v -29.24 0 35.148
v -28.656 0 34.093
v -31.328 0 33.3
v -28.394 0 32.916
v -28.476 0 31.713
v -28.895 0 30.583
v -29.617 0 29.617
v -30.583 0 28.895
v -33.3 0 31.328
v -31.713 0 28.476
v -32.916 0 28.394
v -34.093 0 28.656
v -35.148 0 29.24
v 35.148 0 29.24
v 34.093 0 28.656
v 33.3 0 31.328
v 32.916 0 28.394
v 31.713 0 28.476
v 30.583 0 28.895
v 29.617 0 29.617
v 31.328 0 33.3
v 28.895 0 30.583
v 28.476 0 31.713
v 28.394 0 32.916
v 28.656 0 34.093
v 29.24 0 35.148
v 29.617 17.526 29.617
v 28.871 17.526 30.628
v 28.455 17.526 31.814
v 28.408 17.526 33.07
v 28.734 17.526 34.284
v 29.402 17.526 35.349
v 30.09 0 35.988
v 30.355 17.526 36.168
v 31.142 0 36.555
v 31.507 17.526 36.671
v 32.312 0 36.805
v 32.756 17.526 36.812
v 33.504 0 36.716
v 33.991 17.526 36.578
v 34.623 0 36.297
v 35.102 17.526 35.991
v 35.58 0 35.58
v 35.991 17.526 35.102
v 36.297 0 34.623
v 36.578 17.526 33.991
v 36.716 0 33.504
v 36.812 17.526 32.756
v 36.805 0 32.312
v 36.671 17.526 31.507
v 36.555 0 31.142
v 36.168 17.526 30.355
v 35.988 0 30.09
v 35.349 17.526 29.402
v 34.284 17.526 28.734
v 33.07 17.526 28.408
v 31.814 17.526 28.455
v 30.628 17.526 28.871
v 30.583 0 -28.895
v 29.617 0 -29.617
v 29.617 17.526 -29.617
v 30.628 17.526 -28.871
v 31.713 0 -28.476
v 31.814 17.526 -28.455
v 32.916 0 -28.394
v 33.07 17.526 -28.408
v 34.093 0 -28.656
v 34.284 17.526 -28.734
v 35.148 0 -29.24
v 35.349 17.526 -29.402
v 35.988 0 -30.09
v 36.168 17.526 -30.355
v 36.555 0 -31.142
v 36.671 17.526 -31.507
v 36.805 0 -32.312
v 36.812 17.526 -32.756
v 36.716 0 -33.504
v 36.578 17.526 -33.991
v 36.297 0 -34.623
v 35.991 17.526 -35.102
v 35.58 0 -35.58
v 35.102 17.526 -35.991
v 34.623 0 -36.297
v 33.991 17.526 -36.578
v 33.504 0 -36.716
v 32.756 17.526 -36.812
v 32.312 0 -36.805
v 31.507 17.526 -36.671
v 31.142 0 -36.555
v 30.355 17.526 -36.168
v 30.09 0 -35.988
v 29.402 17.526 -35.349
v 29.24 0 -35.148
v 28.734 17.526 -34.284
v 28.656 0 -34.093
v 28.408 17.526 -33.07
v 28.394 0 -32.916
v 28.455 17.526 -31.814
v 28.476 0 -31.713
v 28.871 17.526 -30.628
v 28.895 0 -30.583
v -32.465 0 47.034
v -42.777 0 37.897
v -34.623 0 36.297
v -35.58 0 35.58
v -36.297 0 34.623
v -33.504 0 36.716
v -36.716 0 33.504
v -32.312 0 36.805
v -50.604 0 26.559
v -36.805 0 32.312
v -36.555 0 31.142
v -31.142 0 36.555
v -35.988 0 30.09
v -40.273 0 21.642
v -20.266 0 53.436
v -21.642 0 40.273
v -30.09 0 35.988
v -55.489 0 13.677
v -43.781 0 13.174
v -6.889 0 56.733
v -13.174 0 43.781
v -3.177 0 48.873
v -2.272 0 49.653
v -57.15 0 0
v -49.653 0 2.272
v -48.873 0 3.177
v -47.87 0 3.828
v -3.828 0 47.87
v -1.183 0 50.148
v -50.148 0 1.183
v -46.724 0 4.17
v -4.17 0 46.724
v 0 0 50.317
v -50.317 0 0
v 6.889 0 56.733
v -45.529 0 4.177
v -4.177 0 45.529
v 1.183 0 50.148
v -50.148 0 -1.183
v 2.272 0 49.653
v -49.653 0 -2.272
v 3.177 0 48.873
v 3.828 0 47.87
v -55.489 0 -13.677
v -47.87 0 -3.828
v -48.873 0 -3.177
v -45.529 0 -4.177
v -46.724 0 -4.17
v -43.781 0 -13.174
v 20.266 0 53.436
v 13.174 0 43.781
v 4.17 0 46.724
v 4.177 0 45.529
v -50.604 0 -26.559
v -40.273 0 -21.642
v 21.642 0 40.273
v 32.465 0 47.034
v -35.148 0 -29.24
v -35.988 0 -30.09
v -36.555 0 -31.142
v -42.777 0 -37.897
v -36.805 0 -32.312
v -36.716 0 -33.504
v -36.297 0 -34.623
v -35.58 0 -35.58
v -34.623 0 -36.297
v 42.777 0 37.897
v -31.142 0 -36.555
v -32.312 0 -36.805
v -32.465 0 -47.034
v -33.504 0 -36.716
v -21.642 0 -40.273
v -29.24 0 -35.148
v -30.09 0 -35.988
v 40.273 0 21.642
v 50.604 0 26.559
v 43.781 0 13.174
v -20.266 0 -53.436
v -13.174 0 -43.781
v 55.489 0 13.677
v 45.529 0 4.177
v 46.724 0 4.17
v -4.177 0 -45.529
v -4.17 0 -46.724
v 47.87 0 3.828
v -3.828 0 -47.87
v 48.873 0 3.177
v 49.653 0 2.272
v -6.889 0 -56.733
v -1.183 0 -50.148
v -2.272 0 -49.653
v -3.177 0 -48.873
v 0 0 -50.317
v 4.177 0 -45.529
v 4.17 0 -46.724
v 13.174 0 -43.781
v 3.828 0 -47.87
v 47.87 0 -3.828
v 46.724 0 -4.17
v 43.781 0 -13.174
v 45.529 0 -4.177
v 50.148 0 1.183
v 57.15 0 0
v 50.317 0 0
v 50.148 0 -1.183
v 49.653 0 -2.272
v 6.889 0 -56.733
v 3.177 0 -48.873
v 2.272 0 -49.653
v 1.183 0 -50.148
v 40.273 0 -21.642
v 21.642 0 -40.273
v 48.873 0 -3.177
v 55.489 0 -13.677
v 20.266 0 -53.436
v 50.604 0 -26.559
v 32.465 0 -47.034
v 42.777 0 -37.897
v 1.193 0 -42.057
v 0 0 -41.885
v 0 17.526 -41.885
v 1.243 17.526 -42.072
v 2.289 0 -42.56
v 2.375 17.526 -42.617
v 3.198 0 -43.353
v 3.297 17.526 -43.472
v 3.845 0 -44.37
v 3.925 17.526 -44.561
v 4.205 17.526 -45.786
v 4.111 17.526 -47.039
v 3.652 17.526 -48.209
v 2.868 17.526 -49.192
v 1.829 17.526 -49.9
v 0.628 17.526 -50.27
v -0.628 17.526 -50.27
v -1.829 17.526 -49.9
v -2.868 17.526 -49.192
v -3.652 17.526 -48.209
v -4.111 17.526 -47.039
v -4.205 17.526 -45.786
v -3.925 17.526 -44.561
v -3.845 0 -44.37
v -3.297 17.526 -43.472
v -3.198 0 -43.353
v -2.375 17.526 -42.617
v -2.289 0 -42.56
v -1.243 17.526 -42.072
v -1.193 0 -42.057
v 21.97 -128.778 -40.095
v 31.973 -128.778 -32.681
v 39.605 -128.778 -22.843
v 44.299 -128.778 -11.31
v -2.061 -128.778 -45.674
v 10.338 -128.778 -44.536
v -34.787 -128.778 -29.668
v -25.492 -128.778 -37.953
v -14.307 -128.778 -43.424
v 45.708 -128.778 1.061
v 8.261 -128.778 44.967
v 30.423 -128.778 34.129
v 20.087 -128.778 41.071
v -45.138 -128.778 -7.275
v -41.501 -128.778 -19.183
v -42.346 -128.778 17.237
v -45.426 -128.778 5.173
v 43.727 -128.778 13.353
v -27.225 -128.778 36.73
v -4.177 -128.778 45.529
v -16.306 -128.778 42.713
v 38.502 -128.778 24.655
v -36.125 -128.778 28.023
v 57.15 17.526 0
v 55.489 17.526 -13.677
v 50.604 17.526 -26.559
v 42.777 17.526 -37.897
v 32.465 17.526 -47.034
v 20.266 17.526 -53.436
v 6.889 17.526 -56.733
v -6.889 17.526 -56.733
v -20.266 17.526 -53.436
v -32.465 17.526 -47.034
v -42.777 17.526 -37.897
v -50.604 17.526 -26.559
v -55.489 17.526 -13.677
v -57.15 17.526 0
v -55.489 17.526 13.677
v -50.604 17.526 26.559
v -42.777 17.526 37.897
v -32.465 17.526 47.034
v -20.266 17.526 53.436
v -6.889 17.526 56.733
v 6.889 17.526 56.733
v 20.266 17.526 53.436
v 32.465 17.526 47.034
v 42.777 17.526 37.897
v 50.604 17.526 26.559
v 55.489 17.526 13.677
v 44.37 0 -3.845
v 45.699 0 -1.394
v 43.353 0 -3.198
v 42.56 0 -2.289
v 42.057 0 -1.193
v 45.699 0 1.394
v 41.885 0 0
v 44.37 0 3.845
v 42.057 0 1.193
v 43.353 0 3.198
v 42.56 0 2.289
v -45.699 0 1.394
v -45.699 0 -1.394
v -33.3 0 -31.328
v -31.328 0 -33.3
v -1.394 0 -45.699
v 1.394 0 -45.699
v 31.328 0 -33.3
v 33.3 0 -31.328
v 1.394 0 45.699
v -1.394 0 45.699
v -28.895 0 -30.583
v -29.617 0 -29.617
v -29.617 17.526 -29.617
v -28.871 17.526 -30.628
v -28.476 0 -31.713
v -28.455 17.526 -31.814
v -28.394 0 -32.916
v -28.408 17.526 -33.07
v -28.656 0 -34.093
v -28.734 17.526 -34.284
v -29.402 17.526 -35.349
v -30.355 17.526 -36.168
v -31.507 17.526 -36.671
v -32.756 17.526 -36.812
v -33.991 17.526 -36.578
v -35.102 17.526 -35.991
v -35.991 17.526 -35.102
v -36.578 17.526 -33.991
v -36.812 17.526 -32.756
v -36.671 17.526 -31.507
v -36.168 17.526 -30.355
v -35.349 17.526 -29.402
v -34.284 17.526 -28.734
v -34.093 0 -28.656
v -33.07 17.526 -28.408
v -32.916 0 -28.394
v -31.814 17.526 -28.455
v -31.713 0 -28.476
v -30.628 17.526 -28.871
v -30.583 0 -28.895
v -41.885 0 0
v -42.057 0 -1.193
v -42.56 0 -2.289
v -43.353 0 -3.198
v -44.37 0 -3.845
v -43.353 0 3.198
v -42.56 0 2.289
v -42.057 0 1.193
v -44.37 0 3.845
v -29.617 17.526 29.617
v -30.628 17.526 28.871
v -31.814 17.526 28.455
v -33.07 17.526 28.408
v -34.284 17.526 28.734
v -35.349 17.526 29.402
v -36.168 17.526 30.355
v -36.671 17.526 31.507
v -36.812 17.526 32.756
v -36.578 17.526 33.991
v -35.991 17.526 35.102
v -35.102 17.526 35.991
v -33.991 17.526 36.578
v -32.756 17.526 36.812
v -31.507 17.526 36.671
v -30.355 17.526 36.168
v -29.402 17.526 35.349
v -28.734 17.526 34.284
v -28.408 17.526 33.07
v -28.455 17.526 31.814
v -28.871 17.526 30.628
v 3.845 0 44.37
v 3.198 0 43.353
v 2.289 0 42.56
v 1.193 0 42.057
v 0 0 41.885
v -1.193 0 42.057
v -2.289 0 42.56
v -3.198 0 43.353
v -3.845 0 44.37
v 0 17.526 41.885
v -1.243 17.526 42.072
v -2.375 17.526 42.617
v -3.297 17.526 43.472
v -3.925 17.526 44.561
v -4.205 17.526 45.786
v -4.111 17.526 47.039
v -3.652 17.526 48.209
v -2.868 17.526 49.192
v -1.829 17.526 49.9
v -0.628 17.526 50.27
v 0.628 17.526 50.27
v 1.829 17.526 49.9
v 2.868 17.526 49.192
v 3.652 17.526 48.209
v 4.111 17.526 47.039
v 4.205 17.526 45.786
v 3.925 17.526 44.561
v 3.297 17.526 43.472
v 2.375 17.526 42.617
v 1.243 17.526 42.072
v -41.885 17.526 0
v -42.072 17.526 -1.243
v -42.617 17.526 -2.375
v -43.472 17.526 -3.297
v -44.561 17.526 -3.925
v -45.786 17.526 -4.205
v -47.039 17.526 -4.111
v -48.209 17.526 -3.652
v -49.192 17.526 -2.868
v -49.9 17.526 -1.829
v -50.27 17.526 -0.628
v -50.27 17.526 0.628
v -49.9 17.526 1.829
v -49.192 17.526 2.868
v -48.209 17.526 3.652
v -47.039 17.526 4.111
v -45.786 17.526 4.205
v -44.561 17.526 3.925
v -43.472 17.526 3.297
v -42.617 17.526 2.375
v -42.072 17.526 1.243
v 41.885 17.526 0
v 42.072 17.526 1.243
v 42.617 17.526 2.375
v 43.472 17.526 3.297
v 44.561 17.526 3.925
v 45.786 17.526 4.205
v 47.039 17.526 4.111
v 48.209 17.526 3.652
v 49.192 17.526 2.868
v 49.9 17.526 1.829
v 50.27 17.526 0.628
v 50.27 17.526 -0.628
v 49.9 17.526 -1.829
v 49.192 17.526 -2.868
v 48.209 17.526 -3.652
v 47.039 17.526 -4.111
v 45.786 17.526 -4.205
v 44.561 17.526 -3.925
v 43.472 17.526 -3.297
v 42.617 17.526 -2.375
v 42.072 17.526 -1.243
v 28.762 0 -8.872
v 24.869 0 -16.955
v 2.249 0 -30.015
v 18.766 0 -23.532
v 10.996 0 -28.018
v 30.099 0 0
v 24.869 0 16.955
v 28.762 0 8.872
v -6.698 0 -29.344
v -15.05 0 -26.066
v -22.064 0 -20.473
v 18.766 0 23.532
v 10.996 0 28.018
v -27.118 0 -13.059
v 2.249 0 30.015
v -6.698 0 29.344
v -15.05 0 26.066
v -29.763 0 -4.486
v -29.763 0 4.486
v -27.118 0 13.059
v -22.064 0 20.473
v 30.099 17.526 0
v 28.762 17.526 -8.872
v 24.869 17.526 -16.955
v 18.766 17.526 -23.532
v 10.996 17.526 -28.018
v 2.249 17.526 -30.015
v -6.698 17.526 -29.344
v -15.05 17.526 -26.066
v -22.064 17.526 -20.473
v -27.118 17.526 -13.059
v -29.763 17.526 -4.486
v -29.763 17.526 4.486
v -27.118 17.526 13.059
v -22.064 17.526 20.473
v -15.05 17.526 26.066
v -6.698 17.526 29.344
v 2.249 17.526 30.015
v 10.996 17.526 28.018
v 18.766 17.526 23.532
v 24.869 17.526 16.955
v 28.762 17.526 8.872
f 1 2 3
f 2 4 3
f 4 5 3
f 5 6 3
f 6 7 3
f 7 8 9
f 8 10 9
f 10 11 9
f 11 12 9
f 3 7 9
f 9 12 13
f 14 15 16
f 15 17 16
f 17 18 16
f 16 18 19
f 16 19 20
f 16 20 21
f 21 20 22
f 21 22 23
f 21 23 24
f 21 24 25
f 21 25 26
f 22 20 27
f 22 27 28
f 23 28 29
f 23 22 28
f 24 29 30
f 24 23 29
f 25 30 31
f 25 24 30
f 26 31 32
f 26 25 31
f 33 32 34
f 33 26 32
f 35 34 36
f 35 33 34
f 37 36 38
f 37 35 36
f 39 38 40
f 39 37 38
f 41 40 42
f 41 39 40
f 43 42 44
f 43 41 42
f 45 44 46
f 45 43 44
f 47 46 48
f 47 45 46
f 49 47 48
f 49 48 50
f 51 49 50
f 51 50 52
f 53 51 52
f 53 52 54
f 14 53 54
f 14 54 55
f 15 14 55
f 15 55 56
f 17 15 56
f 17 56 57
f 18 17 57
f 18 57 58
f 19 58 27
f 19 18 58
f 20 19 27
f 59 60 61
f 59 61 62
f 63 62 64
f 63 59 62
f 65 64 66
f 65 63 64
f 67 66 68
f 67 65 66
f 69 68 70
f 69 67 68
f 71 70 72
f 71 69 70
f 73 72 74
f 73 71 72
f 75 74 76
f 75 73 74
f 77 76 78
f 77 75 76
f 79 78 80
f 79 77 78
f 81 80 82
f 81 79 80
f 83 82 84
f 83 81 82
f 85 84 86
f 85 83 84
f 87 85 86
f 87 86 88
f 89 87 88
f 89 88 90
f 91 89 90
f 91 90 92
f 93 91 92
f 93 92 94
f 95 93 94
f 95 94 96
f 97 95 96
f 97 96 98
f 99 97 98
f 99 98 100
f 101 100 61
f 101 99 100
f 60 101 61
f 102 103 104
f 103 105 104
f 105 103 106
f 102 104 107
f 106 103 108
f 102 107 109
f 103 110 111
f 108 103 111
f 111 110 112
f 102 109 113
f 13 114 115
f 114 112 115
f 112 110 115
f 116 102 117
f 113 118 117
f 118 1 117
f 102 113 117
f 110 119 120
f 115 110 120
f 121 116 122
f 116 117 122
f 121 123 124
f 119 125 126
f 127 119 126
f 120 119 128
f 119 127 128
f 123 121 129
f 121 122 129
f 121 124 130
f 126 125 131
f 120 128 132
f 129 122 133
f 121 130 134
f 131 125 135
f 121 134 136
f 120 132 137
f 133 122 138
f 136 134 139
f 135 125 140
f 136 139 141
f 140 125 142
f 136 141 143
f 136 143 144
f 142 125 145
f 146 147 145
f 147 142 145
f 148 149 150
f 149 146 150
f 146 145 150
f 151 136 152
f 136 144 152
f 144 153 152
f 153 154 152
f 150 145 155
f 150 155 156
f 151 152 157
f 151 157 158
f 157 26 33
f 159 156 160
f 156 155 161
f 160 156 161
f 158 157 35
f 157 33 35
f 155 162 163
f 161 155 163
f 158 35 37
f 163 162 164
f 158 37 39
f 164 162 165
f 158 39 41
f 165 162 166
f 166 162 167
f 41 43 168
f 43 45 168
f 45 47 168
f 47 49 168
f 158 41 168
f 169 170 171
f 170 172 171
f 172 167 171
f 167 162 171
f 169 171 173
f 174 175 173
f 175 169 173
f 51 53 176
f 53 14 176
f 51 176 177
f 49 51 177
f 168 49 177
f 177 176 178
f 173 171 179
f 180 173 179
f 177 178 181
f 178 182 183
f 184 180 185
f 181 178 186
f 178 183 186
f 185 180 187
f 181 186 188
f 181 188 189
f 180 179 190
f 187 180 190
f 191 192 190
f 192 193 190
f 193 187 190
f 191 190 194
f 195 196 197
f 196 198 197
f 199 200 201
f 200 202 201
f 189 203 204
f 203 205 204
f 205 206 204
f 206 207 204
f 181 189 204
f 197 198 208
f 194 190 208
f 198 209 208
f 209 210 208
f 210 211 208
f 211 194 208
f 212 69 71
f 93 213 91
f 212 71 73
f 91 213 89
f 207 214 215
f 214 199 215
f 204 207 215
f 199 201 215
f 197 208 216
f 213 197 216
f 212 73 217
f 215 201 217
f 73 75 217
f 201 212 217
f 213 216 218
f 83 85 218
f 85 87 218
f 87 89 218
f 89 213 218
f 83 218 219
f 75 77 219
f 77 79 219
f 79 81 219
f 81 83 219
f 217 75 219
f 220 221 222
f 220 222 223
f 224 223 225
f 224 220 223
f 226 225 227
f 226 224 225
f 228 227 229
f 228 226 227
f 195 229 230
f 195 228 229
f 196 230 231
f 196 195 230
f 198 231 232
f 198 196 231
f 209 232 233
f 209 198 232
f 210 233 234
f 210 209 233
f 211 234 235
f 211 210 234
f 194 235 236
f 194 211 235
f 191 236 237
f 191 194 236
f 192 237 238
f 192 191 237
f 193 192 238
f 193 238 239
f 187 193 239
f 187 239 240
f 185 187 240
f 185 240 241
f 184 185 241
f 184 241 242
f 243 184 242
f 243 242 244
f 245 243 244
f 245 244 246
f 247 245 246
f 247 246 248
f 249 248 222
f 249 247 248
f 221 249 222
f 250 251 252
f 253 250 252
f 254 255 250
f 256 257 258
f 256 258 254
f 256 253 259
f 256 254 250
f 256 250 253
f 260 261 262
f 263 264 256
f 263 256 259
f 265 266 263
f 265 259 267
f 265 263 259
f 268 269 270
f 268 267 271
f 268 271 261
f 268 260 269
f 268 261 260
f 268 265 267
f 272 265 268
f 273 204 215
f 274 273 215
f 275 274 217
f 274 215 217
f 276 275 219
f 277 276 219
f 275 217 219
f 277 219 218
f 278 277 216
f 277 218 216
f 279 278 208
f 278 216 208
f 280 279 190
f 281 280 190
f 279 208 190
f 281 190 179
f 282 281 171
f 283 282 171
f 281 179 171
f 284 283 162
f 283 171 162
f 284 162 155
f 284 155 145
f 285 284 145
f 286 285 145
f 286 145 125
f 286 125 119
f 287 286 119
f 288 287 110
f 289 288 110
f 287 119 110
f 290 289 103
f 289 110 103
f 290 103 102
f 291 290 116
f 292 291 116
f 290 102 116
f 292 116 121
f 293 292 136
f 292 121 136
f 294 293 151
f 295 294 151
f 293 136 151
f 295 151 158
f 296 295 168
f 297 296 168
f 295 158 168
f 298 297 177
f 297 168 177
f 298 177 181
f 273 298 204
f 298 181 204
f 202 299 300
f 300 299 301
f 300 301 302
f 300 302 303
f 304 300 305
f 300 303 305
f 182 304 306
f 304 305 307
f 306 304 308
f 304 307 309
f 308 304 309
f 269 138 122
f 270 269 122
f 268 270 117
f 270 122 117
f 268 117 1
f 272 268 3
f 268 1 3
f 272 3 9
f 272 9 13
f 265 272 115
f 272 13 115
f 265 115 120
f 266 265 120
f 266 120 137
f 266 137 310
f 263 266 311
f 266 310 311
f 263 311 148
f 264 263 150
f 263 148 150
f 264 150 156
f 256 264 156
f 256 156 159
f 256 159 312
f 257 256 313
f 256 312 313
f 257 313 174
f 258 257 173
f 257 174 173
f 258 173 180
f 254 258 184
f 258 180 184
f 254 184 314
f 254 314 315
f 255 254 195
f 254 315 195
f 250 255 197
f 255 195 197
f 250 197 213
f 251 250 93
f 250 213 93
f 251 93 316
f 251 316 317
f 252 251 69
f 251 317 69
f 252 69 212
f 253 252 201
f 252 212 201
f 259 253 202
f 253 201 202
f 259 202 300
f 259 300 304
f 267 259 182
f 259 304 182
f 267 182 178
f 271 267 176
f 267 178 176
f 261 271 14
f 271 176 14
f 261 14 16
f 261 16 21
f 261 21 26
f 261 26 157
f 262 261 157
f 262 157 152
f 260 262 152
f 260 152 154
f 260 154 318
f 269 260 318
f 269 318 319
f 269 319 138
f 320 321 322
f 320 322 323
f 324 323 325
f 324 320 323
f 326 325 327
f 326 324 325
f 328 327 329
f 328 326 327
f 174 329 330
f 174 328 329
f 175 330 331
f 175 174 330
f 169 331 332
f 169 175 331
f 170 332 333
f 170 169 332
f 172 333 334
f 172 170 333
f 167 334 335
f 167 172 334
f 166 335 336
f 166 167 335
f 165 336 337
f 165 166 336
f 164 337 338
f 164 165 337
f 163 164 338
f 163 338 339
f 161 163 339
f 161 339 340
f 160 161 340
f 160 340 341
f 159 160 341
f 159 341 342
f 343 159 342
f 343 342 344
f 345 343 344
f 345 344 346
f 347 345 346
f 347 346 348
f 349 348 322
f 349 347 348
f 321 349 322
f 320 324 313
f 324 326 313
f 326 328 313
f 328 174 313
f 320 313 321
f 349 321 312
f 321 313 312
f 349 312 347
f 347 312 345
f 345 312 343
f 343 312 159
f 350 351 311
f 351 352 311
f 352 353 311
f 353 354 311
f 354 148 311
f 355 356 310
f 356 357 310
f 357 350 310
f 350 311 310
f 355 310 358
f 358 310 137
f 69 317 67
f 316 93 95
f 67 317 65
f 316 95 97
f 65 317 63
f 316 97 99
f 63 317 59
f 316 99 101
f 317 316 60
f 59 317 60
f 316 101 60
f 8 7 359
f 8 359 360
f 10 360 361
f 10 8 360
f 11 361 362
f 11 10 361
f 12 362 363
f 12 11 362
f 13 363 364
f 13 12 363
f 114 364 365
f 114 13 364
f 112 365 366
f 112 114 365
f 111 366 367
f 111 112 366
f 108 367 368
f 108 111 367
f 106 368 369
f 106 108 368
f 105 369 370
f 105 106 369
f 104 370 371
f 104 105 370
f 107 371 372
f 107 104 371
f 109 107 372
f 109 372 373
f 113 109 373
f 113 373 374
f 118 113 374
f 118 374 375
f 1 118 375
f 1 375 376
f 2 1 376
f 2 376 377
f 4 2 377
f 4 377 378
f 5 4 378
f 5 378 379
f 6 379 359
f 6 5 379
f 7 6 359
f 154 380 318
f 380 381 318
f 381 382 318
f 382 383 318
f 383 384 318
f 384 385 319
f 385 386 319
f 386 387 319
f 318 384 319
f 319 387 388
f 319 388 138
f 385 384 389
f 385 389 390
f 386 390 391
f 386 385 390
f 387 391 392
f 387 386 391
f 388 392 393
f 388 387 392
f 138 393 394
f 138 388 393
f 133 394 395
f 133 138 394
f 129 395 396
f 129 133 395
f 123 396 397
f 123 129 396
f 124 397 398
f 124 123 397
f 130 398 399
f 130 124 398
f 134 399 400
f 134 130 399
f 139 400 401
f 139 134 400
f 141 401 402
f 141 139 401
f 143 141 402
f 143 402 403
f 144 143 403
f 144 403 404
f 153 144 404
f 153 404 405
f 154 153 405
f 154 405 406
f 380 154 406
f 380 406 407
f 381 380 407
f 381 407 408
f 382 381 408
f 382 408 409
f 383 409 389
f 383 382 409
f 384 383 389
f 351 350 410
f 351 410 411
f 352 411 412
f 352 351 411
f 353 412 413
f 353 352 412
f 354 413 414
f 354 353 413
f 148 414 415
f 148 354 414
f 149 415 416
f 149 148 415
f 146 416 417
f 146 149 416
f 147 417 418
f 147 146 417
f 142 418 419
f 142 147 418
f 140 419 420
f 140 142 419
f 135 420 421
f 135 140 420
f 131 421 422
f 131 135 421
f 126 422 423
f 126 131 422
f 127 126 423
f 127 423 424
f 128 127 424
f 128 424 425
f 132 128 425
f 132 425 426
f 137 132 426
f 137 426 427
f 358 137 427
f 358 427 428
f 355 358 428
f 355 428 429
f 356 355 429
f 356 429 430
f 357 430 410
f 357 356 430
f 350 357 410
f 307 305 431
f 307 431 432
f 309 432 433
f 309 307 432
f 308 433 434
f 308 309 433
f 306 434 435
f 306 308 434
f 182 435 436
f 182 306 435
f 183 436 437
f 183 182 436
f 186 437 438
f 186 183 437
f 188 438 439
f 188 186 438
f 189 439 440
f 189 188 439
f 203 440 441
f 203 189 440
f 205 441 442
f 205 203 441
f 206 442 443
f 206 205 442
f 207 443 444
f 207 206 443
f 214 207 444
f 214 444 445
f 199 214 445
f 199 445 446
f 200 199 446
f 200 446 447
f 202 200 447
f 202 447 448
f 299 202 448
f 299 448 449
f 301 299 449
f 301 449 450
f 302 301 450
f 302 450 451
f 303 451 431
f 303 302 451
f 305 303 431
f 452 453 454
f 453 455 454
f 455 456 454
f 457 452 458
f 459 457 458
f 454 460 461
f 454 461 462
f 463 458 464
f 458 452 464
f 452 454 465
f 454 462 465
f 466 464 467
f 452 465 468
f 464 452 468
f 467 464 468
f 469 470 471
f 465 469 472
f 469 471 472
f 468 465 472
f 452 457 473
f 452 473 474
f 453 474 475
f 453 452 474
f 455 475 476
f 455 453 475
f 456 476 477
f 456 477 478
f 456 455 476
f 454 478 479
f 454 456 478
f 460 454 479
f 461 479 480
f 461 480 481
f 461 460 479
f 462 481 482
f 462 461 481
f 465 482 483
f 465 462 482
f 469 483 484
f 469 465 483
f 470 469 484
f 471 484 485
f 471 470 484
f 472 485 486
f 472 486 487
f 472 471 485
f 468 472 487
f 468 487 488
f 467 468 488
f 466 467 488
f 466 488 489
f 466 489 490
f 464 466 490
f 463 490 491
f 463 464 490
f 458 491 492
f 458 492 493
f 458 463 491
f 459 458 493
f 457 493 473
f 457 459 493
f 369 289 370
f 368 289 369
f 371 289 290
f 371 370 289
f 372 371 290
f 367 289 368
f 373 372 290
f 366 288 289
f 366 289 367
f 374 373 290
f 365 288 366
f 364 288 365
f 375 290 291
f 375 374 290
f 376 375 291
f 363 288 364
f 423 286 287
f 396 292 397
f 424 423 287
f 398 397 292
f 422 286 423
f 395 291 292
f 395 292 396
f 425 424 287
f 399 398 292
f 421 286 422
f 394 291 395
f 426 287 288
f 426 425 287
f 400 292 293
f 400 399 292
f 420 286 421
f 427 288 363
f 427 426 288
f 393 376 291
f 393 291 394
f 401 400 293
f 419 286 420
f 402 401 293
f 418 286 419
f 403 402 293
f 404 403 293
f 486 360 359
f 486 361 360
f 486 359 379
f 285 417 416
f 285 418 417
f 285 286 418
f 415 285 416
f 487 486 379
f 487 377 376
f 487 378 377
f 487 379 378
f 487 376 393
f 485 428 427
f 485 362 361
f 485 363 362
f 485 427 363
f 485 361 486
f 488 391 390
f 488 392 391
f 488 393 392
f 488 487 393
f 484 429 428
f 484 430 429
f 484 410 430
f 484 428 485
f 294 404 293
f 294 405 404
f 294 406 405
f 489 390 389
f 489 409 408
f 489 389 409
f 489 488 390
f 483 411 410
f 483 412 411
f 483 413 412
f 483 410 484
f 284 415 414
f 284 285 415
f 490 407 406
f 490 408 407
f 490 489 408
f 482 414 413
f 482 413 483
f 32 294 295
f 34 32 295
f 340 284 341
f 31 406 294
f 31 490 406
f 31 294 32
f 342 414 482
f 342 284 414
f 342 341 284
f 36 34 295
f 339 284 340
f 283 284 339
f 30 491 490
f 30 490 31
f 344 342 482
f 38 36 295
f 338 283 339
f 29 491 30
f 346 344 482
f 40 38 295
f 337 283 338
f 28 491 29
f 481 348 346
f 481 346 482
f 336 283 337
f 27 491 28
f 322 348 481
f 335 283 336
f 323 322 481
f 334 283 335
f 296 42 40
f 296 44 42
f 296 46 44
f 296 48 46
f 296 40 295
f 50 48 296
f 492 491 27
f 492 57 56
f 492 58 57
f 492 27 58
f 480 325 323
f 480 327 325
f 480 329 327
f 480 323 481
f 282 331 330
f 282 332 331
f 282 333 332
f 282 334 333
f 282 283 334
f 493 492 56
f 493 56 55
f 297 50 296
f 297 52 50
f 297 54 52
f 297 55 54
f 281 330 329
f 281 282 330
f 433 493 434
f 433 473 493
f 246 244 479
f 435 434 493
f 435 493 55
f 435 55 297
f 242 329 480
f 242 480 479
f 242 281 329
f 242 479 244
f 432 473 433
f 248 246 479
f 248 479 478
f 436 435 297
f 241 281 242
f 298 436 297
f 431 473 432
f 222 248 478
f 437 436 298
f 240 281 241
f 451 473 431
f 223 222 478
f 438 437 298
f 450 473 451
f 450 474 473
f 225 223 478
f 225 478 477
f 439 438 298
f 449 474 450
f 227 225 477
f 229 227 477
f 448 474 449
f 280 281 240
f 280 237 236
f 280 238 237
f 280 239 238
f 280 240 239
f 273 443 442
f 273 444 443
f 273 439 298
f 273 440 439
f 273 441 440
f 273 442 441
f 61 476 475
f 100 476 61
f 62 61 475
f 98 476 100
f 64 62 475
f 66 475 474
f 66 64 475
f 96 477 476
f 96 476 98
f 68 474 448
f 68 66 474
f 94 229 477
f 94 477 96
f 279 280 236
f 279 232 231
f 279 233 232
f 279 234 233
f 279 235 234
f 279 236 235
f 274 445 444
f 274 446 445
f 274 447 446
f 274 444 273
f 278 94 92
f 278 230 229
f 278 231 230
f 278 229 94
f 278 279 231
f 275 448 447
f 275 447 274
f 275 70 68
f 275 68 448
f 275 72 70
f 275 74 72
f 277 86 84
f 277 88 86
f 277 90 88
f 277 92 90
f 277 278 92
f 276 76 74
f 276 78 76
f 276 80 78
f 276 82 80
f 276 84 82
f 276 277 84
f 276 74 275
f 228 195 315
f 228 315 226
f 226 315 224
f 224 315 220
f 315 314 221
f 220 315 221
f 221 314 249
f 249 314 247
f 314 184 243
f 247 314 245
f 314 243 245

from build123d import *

# Parameters (mm, degrees)
SKETCH1_R           = 57.15
SKETCH1_R_2         = 30.099
EXTRUDE_THIN1_DEPTH = 17.526
SKETCH2_R           = 4.2164
CUT_EXTRUDE2_DEPTH  = 17.526
CIRPATTERN1_COUNT   = 8
SKETCH5_R           = 45.72
EXTRUDE1_DEPTH      = 128.778


with BuildPart() as part:
    # Sketch1 → Extrude-Thin1 (new body)
    with BuildSketch(Plane(origin=(0, 0, 0), x_dir=(1, 0, 0), z_dir=(0, 1, 0))):
        Circle(SKETCH1_R)
        Circle(SKETCH1_R_2, mode=Mode.SUBTRACT)
    extrude(amount=EXTRUDE_THIN1_DEPTH)

    # Sketch2 → Cut-Extrude2 (cut)
    with BuildSketch(Plane(origin=(0, 0, 0), x_dir=(1, 0, 0), z_dir=(0, 1, 0))):
        with Locations((0, 46.101)):
            Circle(SKETCH2_R)
    cut_extrude2 = extrude(amount=CUT_EXTRUDE2_DEPTH, mode=Mode.SUBTRACT)

    # CirPattern1: Cut-Extrude2 ×8 about axis
    cirpattern1_axis = Axis((0, 58.676993495, 0), (0, -1, 0))
    for i in range(1, CIRPATTERN1_COUNT):
        add(cut_extrude2.rotate(cirpattern1_axis, i * 360 / CIRPATTERN1_COUNT), mode=Mode.SUBTRACT)

    # Sketch5 → Extrude1 (add)
    with BuildSketch(Plane.XZ):
        Circle(SKETCH5_R)
    extrude(amount=EXTRUDE1_DEPTH)


solid = part.part
